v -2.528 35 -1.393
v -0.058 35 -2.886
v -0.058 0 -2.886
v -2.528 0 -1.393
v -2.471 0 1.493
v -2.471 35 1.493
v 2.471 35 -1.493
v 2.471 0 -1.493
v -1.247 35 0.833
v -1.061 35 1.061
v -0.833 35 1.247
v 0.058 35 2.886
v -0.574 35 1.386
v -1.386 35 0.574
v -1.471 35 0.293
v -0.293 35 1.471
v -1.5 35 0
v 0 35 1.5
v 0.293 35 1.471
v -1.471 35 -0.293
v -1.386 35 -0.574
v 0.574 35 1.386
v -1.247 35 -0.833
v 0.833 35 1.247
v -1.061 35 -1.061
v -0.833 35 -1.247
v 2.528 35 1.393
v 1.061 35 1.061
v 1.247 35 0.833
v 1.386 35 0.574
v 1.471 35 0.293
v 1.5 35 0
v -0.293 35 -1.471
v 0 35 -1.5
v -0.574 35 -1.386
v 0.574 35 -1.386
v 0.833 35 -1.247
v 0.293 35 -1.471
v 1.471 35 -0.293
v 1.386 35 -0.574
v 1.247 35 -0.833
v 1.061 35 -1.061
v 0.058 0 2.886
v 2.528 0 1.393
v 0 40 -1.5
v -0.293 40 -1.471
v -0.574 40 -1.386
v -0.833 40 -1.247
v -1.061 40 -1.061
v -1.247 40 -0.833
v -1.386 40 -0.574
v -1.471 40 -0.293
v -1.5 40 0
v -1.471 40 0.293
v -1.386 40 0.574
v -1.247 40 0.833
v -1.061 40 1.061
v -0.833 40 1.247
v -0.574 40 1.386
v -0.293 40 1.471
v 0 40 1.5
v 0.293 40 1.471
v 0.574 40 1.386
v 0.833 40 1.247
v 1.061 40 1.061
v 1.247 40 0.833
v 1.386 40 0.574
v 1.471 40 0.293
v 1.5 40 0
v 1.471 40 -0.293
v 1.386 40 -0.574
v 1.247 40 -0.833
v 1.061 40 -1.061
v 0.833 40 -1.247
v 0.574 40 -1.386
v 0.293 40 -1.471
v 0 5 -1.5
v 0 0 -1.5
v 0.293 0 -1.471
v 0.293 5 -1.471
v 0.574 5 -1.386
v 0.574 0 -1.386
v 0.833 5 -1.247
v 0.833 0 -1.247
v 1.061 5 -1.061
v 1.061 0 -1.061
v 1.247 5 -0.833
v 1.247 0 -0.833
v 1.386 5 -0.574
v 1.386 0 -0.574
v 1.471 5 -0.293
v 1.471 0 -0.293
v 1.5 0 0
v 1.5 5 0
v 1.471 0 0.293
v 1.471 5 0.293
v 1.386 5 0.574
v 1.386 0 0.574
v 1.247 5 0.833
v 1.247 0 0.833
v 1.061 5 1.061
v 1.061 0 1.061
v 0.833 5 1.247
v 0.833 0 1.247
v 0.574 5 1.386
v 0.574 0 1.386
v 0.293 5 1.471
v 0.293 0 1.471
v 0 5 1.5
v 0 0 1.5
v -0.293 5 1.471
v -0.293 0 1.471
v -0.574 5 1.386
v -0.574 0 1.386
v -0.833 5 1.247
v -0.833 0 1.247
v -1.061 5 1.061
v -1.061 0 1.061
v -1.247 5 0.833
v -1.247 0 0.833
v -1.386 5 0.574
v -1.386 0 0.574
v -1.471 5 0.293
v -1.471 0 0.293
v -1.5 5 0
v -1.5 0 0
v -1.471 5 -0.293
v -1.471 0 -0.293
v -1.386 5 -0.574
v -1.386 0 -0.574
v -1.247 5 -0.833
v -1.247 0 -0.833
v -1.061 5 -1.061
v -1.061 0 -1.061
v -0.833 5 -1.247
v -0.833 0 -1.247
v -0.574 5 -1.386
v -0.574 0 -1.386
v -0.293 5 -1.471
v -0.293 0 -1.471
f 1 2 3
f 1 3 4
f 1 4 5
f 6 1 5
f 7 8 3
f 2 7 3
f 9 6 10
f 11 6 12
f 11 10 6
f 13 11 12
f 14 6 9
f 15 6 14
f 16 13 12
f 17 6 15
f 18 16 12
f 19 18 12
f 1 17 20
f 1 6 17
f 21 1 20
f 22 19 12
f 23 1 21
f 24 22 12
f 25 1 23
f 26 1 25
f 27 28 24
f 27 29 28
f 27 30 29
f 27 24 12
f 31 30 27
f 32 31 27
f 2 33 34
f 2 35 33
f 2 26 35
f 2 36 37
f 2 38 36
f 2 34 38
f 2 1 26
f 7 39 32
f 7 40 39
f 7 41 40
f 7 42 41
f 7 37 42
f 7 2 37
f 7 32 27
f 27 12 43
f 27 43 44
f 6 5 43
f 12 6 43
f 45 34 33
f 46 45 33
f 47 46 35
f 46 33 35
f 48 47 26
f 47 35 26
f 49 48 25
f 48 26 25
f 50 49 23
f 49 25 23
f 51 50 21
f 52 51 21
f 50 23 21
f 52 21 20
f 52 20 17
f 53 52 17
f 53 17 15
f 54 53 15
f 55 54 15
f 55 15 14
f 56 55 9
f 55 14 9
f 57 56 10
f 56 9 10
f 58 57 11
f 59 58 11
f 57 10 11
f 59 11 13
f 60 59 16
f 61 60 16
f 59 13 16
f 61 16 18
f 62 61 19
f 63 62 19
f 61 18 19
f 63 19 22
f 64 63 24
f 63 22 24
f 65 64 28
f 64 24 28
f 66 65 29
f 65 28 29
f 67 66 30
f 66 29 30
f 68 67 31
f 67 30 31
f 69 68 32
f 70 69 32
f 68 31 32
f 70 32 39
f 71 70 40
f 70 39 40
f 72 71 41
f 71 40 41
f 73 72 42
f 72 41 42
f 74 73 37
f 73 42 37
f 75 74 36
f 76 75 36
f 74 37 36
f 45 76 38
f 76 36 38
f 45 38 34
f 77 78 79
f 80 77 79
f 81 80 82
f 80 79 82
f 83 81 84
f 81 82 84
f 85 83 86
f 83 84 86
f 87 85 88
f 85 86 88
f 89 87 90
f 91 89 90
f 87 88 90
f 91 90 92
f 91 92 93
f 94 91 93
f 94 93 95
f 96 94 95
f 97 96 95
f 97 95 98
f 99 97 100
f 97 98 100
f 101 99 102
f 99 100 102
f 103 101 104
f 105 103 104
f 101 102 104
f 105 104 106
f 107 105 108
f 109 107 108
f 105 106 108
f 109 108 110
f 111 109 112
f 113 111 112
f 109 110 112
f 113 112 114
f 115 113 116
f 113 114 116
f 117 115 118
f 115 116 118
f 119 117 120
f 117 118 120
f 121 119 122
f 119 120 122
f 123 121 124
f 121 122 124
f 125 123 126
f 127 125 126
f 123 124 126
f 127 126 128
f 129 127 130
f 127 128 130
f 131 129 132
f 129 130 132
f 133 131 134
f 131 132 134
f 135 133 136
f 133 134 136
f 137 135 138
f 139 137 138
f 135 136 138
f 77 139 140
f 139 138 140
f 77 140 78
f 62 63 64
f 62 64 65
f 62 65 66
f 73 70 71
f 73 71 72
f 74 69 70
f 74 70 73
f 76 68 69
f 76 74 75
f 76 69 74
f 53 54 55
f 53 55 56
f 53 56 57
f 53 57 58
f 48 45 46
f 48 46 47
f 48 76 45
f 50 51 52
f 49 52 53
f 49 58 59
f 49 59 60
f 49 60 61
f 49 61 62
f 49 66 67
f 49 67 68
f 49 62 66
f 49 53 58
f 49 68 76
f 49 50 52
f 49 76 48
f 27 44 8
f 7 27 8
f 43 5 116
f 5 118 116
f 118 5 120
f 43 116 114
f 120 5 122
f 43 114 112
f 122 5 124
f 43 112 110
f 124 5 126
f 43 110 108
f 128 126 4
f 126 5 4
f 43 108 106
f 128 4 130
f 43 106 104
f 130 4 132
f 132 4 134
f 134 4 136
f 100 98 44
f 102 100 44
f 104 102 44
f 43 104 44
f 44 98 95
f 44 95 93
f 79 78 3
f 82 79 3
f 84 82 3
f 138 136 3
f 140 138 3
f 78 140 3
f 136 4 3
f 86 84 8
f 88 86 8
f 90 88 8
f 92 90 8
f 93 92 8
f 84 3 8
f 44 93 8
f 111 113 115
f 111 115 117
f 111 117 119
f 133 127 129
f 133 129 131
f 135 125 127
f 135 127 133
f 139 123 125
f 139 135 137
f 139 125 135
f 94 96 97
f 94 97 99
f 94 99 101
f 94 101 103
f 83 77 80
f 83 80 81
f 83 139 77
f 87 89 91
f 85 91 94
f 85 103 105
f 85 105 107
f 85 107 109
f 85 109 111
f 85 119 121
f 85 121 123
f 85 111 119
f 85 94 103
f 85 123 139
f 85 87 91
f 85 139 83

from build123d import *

# Parameters (mm, degrees)
EXTRUDE_1_DEPTH     = 35
SKETCH_2_R          = 1.5
CUT_EXTRUDE_1_DEPTH = 5
SKETCH_3_R          = 1.5
EXTRUDE_2_DEPTH     = 5


with BuildPart() as part:
    # 草图1 → 凸台-拉伸1 (new body)
    with BuildSketch(Plane(origin=(0, 0, 0), x_dir=(1, 0, 0), z_dir=(0, 1, 0))):
        Polygon((2.528327266, -1.393159922), (2.470675517, 1.49301568), (-0.057651749, 2.886175603), (-2.528327266, 1.393159922), (-2.470675517, -1.49301568), (0.057651749, -2.886175603), align=None)
    extrude(amount=EXTRUDE_1_DEPTH)

    # 草图2 → 切除-拉伸1 (cut)
    with BuildSketch(Plane.XZ):
        with Locations(Location((0, 0, 0), (0, 0, 270))):
            Circle(SKETCH_2_R)
    extrude(amount=-CUT_EXTRUDE_1_DEPTH, mode=Mode.SUBTRACT)

    # 草图3 → 凸台-拉伸2 (add)
    with BuildSketch(Plane(origin=(0, 35, 0), x_dir=(1, 0, 0), z_dir=(0, 1, 0))):
        with Locations(Location((0, 0, 0), (0, 0, 90))):
            Circle(SKETCH_3_R)
    extrude(amount=EXTRUDE_2_DEPTH)


solid = part.part
